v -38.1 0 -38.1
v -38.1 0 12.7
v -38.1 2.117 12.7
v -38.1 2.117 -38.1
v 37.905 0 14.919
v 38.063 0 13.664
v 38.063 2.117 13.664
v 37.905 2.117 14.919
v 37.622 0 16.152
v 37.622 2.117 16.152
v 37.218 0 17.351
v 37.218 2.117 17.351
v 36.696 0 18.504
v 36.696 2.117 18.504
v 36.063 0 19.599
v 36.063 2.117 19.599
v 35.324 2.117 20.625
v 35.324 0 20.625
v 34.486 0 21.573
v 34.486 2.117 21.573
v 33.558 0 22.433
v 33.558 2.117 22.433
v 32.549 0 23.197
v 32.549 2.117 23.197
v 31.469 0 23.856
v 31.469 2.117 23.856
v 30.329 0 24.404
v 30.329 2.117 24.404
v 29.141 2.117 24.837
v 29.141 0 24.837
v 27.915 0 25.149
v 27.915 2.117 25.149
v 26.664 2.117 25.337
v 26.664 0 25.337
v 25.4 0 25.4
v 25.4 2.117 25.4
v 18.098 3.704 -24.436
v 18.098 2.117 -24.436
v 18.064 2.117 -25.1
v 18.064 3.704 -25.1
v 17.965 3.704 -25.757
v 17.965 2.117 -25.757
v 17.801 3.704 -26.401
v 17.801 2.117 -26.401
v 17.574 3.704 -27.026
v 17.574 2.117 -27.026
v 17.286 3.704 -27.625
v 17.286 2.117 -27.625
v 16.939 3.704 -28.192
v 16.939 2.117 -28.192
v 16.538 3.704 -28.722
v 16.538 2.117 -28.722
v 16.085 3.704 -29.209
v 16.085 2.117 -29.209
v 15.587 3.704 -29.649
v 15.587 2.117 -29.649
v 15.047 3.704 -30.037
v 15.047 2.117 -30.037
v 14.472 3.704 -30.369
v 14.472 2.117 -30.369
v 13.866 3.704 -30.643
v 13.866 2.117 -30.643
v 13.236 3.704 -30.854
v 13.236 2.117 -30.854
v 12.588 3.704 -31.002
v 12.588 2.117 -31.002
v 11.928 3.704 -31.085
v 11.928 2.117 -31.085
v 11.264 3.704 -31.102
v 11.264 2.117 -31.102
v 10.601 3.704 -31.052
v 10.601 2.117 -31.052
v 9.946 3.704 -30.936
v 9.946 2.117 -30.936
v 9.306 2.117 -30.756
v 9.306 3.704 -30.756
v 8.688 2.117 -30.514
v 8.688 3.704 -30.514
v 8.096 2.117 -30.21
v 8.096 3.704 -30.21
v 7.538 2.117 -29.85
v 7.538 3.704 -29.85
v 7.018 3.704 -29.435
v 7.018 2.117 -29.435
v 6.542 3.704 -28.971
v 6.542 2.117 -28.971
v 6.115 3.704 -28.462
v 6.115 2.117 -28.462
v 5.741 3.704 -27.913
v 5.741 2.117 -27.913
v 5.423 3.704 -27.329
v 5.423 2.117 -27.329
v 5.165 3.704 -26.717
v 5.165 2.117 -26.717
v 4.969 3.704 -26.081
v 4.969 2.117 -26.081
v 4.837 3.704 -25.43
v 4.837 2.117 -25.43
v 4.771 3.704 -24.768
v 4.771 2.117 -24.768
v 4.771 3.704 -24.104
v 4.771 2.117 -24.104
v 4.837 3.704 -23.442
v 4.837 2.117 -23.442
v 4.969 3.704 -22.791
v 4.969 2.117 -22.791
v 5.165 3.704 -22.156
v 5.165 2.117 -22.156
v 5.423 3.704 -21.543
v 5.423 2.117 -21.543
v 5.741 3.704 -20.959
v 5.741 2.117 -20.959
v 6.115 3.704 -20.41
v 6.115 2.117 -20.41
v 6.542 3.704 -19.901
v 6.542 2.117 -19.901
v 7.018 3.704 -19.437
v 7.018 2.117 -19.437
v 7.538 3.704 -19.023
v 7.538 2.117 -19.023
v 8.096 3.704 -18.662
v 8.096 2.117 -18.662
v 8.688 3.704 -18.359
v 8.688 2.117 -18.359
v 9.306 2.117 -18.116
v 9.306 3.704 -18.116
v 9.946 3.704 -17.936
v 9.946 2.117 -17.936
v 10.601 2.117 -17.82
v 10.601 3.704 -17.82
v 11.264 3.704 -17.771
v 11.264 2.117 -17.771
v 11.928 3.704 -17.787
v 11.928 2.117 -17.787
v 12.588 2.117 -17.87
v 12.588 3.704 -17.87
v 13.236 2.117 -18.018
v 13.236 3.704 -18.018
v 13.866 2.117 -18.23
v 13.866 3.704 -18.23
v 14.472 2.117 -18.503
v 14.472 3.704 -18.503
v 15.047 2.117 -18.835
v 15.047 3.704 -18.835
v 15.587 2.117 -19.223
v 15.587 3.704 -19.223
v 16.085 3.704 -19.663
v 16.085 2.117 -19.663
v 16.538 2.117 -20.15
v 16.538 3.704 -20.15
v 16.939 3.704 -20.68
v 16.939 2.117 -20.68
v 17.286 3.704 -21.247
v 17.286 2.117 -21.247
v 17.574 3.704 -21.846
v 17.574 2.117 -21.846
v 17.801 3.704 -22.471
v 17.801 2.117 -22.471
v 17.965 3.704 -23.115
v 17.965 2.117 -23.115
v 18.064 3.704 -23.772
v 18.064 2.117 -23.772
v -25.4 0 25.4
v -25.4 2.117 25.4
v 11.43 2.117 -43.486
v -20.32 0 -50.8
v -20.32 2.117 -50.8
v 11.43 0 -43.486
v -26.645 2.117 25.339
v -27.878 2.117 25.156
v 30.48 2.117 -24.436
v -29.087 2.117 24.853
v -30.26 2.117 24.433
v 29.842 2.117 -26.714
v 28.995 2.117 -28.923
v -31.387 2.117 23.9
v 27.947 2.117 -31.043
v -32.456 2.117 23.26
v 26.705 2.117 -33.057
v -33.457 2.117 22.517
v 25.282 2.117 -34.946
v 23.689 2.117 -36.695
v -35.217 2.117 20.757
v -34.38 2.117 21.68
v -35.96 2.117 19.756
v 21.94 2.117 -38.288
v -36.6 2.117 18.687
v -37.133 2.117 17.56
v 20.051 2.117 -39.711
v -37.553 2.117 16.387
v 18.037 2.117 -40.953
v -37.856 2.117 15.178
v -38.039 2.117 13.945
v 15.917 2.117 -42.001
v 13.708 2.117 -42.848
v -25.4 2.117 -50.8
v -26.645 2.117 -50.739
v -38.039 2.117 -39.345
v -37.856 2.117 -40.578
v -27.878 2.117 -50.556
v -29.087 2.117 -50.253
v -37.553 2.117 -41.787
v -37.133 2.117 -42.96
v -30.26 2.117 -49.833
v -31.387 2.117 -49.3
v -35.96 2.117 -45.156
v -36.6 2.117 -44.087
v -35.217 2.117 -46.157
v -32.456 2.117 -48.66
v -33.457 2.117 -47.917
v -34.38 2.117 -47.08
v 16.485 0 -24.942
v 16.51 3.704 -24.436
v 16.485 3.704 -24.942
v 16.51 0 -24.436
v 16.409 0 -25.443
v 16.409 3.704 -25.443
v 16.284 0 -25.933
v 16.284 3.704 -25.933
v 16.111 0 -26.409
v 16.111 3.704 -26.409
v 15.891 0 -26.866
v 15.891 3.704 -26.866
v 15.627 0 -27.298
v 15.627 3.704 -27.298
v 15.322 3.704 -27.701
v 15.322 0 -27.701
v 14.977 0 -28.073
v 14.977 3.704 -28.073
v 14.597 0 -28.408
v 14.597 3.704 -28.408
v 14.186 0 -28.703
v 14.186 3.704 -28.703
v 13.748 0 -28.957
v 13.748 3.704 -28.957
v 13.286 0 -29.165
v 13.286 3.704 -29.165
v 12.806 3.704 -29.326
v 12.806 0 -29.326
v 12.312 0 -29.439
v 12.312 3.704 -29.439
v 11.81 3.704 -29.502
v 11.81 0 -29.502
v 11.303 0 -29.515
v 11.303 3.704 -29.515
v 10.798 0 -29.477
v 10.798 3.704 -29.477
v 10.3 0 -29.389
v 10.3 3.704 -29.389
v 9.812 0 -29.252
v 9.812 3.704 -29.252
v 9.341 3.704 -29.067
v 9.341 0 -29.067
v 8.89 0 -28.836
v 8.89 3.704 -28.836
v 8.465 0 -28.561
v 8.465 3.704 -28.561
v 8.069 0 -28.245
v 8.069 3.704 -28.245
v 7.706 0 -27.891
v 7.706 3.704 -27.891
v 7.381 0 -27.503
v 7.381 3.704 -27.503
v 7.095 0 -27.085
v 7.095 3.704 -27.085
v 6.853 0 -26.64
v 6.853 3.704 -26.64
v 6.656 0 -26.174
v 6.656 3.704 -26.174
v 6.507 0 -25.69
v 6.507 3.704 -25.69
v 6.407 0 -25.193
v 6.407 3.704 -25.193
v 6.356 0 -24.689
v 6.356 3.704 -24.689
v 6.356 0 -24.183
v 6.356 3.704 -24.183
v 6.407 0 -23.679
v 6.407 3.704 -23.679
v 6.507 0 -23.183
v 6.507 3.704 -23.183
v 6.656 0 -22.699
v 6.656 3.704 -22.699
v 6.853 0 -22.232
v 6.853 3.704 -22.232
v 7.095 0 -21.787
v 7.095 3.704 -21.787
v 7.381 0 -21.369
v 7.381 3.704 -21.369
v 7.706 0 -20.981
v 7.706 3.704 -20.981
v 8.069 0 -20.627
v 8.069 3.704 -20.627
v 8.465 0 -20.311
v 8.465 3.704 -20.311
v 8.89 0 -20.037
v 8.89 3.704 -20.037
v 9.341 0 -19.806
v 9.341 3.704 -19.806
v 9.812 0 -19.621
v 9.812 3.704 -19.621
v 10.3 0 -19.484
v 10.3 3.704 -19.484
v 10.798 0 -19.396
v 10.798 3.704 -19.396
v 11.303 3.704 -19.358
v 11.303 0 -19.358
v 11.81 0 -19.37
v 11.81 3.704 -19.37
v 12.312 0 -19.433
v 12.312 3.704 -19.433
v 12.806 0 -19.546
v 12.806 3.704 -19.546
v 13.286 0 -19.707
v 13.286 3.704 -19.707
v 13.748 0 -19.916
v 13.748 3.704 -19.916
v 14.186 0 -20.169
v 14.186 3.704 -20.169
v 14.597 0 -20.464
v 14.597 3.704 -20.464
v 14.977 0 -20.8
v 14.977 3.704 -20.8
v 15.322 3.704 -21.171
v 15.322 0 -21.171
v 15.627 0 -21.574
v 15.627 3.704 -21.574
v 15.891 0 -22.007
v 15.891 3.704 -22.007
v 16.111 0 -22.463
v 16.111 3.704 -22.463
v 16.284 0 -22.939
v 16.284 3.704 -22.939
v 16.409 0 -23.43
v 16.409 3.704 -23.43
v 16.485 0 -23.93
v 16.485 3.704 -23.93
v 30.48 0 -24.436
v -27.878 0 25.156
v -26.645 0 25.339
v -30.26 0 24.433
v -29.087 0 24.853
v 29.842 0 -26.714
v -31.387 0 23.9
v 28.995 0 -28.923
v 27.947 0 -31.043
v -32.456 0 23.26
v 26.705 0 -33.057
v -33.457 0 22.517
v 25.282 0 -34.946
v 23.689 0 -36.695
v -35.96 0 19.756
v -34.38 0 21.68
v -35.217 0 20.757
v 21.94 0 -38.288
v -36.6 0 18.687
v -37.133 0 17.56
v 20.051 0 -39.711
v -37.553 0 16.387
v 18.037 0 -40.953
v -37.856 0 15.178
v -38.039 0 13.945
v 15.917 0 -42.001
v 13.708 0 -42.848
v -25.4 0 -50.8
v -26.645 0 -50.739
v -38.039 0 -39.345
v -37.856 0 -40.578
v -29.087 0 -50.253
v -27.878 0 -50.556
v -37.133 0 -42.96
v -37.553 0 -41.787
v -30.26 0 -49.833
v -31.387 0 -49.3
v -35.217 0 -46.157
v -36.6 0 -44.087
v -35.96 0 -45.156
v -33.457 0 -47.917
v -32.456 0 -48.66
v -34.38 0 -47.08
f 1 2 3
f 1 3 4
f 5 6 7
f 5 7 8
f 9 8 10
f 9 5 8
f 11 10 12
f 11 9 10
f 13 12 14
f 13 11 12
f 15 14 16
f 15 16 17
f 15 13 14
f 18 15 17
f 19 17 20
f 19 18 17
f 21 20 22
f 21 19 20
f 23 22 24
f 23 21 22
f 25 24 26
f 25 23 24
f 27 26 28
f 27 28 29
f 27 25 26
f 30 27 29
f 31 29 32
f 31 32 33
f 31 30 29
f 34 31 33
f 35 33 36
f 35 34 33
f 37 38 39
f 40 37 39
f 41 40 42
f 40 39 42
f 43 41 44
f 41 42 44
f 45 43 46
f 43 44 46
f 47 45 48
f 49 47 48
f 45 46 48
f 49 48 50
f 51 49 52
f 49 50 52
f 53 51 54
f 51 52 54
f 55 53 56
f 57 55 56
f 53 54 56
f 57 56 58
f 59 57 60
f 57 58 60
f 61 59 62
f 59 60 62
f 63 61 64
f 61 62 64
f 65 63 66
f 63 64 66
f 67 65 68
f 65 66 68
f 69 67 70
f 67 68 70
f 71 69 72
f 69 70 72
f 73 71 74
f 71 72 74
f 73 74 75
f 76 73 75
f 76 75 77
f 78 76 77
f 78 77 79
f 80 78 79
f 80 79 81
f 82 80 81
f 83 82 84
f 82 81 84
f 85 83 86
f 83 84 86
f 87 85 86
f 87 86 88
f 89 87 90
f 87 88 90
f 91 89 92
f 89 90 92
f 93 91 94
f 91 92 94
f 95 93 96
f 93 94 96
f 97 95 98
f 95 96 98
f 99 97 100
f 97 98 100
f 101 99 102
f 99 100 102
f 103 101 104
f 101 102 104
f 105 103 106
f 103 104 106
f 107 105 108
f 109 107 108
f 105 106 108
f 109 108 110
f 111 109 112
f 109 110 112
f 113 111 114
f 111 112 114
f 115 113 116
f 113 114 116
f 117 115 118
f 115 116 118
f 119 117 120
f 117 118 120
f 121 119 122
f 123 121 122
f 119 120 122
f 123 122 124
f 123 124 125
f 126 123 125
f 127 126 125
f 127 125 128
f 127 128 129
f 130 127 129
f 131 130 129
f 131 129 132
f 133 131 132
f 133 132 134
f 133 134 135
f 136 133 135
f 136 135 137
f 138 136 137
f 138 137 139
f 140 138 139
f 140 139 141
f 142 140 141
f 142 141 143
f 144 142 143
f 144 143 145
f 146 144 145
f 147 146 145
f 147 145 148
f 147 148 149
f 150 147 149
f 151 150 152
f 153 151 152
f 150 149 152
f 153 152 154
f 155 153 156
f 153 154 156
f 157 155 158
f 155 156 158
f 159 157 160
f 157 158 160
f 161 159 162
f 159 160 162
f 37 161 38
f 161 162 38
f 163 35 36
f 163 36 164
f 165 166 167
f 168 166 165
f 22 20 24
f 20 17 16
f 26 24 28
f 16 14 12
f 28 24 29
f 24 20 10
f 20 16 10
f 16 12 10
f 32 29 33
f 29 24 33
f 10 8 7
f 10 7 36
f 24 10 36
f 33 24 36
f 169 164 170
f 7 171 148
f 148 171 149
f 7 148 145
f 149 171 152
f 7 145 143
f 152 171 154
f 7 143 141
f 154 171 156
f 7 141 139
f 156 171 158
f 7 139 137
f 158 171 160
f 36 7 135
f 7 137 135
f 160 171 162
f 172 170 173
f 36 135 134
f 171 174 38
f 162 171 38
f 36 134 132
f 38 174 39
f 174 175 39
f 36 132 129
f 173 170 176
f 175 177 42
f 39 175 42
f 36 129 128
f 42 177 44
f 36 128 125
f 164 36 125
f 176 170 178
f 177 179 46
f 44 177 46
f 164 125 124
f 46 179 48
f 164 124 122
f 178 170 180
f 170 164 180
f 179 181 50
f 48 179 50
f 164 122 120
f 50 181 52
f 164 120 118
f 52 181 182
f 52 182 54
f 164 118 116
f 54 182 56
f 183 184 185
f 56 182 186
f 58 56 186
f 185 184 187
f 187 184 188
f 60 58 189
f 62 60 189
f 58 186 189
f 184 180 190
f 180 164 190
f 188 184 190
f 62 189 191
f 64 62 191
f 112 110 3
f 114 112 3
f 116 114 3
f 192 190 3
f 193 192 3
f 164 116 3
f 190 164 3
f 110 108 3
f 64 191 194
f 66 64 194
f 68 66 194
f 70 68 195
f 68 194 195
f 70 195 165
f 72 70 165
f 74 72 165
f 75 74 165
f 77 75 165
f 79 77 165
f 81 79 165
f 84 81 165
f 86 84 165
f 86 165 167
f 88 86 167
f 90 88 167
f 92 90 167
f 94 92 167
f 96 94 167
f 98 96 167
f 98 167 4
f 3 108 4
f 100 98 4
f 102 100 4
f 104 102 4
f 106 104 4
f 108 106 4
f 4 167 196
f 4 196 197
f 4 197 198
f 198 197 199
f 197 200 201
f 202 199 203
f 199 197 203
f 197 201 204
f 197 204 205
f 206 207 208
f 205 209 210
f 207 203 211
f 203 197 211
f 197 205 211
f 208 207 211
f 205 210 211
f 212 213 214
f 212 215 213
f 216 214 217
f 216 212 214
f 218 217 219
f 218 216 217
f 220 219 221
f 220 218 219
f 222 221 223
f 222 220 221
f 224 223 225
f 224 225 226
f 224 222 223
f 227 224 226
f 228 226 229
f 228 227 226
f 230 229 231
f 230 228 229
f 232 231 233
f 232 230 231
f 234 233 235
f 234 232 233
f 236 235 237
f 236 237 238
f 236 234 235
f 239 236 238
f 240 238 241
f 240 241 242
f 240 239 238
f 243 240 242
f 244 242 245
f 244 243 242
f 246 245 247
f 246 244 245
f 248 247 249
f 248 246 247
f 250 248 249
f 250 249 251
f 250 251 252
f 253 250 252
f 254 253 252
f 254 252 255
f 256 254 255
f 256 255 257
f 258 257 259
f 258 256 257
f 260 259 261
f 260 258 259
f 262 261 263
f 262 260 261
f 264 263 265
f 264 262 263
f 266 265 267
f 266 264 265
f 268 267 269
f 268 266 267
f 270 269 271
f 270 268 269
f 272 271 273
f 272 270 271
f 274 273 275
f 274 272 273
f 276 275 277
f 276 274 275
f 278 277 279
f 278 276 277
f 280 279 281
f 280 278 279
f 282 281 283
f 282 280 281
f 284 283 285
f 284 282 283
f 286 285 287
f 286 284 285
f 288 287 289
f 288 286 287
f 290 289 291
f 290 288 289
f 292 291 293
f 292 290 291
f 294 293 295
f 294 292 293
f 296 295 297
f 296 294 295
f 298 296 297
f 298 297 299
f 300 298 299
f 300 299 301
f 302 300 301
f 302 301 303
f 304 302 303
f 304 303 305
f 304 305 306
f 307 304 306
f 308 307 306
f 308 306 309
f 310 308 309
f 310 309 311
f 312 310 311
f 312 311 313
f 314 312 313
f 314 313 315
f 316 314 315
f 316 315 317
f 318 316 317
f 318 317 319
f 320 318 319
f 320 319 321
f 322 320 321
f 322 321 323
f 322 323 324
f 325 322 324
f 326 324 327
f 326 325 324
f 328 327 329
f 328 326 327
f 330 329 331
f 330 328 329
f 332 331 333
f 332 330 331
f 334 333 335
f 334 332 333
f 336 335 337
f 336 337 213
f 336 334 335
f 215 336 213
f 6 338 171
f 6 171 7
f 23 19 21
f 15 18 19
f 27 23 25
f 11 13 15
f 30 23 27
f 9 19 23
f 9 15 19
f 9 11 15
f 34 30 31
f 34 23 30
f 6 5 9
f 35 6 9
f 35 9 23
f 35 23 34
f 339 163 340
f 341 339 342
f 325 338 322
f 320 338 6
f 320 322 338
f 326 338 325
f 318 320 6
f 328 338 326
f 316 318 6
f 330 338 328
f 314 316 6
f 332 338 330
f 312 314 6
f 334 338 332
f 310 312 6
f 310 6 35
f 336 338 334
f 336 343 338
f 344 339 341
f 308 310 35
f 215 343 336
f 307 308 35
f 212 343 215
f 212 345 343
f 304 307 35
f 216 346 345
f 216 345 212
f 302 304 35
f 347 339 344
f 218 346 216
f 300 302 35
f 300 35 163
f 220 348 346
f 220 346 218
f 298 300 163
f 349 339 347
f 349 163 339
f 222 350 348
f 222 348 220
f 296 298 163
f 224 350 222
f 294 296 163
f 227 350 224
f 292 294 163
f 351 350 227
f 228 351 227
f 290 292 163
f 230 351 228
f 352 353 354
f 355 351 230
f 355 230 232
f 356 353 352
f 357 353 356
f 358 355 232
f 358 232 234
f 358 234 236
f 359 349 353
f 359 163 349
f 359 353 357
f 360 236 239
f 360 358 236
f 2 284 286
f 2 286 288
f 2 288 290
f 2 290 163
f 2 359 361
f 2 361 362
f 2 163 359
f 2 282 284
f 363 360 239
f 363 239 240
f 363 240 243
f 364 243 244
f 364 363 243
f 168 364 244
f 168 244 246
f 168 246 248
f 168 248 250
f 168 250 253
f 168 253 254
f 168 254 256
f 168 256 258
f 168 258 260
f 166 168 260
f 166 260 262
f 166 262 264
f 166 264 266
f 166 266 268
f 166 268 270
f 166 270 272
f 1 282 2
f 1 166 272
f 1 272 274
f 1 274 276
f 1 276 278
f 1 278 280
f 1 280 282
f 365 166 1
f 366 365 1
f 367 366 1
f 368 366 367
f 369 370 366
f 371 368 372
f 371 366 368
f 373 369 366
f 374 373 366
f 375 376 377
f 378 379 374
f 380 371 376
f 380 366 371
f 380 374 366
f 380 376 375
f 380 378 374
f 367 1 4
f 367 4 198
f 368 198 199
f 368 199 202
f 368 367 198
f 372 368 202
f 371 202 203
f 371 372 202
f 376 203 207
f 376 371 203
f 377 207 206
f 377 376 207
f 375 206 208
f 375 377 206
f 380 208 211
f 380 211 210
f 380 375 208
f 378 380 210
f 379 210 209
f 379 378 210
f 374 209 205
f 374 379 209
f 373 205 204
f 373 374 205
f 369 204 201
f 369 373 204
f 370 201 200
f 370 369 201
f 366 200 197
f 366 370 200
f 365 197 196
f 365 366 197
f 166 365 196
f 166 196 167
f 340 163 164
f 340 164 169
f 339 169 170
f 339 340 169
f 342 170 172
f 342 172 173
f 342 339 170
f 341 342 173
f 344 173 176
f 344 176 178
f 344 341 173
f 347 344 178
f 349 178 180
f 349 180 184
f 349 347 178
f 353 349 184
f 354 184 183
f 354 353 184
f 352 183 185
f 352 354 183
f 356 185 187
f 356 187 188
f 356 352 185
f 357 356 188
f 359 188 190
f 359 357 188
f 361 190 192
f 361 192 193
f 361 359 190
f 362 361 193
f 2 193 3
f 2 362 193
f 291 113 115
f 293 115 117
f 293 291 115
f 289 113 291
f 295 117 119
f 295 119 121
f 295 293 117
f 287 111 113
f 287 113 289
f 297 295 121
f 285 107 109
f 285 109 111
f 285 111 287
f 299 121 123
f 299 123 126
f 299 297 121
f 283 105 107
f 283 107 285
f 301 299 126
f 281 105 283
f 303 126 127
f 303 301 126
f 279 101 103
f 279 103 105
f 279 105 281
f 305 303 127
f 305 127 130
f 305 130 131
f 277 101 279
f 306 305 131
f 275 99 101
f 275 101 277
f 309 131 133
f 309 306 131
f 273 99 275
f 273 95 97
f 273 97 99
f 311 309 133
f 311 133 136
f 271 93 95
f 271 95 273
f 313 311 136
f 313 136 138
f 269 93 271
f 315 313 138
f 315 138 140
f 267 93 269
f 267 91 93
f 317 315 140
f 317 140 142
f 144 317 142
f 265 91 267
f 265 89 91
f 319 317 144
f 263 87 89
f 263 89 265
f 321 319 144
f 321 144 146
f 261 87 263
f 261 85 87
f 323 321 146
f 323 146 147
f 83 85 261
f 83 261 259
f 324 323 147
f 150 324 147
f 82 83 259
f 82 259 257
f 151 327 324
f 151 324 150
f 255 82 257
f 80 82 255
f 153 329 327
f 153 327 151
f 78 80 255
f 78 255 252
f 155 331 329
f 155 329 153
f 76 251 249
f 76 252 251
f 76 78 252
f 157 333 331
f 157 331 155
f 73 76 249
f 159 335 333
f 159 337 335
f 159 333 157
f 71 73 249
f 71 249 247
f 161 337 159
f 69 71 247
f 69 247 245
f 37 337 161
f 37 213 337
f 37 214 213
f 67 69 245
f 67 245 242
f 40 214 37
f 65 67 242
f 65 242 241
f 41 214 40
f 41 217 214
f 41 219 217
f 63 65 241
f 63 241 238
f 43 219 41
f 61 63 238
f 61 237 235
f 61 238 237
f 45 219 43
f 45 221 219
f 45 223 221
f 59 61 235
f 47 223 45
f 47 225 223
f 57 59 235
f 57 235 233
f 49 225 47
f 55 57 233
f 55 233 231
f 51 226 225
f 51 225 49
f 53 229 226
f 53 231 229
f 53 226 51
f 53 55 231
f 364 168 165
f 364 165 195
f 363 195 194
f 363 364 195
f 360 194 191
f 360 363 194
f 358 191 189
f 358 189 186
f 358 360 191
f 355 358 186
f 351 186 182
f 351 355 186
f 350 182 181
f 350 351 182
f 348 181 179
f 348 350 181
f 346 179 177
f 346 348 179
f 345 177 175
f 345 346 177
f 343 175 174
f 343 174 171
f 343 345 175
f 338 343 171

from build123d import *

# Parameters (mm, degrees)
SKETCH1_R           = 5.08
BOSS_EXTRUDE1_DEPTH = 2.116666667
SKETCH2_R           = 6.6675
SKETCH2_R_2         = 5.08
BOSS_EXTRUDE2_DEPTH = 1.5875


with BuildPart() as part:
    # Sketch1 → Boss-Extrude1 (new body)
    with BuildSketch(Plane(origin=(0, 0, 0), x_dir=(1, 0, 0), z_dir=(0, 1, 0))):
        with BuildLine():
            Line((-25.4, 50.8), (-20.32, 50.8))
            Line((-20.32, 50.8), (11.43, 43.486136085))
            ThreePointArc((11.43, 43.486136085), (23.688747156, 36.694883241), (30.48, 24.436136085))
            Line((30.48, 24.436136085), (38.06337105, -13.663863915))
            ThreePointArc((38.06337105, -13.663863915), (34.032755304, -22.014801976), (25.4, -25.4))
            Line((25.4, -25.4), (-25.4, -25.4))
            ThreePointArc((-25.4, -25.4), (-34.380256121, -21.680256121), (-38.1, -12.7))
            Line((-38.1, -12.7), (-38.1, 38.1))
            ThreePointArc((-38.1, 38.1), (-34.380256121, 47.080256121), (-25.4, 50.8))
        make_face()
        with Locations((11.43, 24.436136085)):
            Circle(SKETCH1_R, mode=Mode.SUBTRACT)
    extrude(amount=BOSS_EXTRUDE1_DEPTH)

    # Sketch2 → Boss-Extrude2 (add)
    with BuildSketch(Plane(origin=(0, 2.116666667, 0), x_dir=(1, 0, 0), z_dir=(0, 1, 0))):
        with Locations((11.43, 24.436136085)):
            Circle(SKETCH2_R)
        with Locations((11.43, 24.436136085)):
            Circle(SKETCH2_R_2, mode=Mode.SUBTRACT)
    extrude(amount=BOSS_EXTRUDE2_DEPTH)


solid = part.part
